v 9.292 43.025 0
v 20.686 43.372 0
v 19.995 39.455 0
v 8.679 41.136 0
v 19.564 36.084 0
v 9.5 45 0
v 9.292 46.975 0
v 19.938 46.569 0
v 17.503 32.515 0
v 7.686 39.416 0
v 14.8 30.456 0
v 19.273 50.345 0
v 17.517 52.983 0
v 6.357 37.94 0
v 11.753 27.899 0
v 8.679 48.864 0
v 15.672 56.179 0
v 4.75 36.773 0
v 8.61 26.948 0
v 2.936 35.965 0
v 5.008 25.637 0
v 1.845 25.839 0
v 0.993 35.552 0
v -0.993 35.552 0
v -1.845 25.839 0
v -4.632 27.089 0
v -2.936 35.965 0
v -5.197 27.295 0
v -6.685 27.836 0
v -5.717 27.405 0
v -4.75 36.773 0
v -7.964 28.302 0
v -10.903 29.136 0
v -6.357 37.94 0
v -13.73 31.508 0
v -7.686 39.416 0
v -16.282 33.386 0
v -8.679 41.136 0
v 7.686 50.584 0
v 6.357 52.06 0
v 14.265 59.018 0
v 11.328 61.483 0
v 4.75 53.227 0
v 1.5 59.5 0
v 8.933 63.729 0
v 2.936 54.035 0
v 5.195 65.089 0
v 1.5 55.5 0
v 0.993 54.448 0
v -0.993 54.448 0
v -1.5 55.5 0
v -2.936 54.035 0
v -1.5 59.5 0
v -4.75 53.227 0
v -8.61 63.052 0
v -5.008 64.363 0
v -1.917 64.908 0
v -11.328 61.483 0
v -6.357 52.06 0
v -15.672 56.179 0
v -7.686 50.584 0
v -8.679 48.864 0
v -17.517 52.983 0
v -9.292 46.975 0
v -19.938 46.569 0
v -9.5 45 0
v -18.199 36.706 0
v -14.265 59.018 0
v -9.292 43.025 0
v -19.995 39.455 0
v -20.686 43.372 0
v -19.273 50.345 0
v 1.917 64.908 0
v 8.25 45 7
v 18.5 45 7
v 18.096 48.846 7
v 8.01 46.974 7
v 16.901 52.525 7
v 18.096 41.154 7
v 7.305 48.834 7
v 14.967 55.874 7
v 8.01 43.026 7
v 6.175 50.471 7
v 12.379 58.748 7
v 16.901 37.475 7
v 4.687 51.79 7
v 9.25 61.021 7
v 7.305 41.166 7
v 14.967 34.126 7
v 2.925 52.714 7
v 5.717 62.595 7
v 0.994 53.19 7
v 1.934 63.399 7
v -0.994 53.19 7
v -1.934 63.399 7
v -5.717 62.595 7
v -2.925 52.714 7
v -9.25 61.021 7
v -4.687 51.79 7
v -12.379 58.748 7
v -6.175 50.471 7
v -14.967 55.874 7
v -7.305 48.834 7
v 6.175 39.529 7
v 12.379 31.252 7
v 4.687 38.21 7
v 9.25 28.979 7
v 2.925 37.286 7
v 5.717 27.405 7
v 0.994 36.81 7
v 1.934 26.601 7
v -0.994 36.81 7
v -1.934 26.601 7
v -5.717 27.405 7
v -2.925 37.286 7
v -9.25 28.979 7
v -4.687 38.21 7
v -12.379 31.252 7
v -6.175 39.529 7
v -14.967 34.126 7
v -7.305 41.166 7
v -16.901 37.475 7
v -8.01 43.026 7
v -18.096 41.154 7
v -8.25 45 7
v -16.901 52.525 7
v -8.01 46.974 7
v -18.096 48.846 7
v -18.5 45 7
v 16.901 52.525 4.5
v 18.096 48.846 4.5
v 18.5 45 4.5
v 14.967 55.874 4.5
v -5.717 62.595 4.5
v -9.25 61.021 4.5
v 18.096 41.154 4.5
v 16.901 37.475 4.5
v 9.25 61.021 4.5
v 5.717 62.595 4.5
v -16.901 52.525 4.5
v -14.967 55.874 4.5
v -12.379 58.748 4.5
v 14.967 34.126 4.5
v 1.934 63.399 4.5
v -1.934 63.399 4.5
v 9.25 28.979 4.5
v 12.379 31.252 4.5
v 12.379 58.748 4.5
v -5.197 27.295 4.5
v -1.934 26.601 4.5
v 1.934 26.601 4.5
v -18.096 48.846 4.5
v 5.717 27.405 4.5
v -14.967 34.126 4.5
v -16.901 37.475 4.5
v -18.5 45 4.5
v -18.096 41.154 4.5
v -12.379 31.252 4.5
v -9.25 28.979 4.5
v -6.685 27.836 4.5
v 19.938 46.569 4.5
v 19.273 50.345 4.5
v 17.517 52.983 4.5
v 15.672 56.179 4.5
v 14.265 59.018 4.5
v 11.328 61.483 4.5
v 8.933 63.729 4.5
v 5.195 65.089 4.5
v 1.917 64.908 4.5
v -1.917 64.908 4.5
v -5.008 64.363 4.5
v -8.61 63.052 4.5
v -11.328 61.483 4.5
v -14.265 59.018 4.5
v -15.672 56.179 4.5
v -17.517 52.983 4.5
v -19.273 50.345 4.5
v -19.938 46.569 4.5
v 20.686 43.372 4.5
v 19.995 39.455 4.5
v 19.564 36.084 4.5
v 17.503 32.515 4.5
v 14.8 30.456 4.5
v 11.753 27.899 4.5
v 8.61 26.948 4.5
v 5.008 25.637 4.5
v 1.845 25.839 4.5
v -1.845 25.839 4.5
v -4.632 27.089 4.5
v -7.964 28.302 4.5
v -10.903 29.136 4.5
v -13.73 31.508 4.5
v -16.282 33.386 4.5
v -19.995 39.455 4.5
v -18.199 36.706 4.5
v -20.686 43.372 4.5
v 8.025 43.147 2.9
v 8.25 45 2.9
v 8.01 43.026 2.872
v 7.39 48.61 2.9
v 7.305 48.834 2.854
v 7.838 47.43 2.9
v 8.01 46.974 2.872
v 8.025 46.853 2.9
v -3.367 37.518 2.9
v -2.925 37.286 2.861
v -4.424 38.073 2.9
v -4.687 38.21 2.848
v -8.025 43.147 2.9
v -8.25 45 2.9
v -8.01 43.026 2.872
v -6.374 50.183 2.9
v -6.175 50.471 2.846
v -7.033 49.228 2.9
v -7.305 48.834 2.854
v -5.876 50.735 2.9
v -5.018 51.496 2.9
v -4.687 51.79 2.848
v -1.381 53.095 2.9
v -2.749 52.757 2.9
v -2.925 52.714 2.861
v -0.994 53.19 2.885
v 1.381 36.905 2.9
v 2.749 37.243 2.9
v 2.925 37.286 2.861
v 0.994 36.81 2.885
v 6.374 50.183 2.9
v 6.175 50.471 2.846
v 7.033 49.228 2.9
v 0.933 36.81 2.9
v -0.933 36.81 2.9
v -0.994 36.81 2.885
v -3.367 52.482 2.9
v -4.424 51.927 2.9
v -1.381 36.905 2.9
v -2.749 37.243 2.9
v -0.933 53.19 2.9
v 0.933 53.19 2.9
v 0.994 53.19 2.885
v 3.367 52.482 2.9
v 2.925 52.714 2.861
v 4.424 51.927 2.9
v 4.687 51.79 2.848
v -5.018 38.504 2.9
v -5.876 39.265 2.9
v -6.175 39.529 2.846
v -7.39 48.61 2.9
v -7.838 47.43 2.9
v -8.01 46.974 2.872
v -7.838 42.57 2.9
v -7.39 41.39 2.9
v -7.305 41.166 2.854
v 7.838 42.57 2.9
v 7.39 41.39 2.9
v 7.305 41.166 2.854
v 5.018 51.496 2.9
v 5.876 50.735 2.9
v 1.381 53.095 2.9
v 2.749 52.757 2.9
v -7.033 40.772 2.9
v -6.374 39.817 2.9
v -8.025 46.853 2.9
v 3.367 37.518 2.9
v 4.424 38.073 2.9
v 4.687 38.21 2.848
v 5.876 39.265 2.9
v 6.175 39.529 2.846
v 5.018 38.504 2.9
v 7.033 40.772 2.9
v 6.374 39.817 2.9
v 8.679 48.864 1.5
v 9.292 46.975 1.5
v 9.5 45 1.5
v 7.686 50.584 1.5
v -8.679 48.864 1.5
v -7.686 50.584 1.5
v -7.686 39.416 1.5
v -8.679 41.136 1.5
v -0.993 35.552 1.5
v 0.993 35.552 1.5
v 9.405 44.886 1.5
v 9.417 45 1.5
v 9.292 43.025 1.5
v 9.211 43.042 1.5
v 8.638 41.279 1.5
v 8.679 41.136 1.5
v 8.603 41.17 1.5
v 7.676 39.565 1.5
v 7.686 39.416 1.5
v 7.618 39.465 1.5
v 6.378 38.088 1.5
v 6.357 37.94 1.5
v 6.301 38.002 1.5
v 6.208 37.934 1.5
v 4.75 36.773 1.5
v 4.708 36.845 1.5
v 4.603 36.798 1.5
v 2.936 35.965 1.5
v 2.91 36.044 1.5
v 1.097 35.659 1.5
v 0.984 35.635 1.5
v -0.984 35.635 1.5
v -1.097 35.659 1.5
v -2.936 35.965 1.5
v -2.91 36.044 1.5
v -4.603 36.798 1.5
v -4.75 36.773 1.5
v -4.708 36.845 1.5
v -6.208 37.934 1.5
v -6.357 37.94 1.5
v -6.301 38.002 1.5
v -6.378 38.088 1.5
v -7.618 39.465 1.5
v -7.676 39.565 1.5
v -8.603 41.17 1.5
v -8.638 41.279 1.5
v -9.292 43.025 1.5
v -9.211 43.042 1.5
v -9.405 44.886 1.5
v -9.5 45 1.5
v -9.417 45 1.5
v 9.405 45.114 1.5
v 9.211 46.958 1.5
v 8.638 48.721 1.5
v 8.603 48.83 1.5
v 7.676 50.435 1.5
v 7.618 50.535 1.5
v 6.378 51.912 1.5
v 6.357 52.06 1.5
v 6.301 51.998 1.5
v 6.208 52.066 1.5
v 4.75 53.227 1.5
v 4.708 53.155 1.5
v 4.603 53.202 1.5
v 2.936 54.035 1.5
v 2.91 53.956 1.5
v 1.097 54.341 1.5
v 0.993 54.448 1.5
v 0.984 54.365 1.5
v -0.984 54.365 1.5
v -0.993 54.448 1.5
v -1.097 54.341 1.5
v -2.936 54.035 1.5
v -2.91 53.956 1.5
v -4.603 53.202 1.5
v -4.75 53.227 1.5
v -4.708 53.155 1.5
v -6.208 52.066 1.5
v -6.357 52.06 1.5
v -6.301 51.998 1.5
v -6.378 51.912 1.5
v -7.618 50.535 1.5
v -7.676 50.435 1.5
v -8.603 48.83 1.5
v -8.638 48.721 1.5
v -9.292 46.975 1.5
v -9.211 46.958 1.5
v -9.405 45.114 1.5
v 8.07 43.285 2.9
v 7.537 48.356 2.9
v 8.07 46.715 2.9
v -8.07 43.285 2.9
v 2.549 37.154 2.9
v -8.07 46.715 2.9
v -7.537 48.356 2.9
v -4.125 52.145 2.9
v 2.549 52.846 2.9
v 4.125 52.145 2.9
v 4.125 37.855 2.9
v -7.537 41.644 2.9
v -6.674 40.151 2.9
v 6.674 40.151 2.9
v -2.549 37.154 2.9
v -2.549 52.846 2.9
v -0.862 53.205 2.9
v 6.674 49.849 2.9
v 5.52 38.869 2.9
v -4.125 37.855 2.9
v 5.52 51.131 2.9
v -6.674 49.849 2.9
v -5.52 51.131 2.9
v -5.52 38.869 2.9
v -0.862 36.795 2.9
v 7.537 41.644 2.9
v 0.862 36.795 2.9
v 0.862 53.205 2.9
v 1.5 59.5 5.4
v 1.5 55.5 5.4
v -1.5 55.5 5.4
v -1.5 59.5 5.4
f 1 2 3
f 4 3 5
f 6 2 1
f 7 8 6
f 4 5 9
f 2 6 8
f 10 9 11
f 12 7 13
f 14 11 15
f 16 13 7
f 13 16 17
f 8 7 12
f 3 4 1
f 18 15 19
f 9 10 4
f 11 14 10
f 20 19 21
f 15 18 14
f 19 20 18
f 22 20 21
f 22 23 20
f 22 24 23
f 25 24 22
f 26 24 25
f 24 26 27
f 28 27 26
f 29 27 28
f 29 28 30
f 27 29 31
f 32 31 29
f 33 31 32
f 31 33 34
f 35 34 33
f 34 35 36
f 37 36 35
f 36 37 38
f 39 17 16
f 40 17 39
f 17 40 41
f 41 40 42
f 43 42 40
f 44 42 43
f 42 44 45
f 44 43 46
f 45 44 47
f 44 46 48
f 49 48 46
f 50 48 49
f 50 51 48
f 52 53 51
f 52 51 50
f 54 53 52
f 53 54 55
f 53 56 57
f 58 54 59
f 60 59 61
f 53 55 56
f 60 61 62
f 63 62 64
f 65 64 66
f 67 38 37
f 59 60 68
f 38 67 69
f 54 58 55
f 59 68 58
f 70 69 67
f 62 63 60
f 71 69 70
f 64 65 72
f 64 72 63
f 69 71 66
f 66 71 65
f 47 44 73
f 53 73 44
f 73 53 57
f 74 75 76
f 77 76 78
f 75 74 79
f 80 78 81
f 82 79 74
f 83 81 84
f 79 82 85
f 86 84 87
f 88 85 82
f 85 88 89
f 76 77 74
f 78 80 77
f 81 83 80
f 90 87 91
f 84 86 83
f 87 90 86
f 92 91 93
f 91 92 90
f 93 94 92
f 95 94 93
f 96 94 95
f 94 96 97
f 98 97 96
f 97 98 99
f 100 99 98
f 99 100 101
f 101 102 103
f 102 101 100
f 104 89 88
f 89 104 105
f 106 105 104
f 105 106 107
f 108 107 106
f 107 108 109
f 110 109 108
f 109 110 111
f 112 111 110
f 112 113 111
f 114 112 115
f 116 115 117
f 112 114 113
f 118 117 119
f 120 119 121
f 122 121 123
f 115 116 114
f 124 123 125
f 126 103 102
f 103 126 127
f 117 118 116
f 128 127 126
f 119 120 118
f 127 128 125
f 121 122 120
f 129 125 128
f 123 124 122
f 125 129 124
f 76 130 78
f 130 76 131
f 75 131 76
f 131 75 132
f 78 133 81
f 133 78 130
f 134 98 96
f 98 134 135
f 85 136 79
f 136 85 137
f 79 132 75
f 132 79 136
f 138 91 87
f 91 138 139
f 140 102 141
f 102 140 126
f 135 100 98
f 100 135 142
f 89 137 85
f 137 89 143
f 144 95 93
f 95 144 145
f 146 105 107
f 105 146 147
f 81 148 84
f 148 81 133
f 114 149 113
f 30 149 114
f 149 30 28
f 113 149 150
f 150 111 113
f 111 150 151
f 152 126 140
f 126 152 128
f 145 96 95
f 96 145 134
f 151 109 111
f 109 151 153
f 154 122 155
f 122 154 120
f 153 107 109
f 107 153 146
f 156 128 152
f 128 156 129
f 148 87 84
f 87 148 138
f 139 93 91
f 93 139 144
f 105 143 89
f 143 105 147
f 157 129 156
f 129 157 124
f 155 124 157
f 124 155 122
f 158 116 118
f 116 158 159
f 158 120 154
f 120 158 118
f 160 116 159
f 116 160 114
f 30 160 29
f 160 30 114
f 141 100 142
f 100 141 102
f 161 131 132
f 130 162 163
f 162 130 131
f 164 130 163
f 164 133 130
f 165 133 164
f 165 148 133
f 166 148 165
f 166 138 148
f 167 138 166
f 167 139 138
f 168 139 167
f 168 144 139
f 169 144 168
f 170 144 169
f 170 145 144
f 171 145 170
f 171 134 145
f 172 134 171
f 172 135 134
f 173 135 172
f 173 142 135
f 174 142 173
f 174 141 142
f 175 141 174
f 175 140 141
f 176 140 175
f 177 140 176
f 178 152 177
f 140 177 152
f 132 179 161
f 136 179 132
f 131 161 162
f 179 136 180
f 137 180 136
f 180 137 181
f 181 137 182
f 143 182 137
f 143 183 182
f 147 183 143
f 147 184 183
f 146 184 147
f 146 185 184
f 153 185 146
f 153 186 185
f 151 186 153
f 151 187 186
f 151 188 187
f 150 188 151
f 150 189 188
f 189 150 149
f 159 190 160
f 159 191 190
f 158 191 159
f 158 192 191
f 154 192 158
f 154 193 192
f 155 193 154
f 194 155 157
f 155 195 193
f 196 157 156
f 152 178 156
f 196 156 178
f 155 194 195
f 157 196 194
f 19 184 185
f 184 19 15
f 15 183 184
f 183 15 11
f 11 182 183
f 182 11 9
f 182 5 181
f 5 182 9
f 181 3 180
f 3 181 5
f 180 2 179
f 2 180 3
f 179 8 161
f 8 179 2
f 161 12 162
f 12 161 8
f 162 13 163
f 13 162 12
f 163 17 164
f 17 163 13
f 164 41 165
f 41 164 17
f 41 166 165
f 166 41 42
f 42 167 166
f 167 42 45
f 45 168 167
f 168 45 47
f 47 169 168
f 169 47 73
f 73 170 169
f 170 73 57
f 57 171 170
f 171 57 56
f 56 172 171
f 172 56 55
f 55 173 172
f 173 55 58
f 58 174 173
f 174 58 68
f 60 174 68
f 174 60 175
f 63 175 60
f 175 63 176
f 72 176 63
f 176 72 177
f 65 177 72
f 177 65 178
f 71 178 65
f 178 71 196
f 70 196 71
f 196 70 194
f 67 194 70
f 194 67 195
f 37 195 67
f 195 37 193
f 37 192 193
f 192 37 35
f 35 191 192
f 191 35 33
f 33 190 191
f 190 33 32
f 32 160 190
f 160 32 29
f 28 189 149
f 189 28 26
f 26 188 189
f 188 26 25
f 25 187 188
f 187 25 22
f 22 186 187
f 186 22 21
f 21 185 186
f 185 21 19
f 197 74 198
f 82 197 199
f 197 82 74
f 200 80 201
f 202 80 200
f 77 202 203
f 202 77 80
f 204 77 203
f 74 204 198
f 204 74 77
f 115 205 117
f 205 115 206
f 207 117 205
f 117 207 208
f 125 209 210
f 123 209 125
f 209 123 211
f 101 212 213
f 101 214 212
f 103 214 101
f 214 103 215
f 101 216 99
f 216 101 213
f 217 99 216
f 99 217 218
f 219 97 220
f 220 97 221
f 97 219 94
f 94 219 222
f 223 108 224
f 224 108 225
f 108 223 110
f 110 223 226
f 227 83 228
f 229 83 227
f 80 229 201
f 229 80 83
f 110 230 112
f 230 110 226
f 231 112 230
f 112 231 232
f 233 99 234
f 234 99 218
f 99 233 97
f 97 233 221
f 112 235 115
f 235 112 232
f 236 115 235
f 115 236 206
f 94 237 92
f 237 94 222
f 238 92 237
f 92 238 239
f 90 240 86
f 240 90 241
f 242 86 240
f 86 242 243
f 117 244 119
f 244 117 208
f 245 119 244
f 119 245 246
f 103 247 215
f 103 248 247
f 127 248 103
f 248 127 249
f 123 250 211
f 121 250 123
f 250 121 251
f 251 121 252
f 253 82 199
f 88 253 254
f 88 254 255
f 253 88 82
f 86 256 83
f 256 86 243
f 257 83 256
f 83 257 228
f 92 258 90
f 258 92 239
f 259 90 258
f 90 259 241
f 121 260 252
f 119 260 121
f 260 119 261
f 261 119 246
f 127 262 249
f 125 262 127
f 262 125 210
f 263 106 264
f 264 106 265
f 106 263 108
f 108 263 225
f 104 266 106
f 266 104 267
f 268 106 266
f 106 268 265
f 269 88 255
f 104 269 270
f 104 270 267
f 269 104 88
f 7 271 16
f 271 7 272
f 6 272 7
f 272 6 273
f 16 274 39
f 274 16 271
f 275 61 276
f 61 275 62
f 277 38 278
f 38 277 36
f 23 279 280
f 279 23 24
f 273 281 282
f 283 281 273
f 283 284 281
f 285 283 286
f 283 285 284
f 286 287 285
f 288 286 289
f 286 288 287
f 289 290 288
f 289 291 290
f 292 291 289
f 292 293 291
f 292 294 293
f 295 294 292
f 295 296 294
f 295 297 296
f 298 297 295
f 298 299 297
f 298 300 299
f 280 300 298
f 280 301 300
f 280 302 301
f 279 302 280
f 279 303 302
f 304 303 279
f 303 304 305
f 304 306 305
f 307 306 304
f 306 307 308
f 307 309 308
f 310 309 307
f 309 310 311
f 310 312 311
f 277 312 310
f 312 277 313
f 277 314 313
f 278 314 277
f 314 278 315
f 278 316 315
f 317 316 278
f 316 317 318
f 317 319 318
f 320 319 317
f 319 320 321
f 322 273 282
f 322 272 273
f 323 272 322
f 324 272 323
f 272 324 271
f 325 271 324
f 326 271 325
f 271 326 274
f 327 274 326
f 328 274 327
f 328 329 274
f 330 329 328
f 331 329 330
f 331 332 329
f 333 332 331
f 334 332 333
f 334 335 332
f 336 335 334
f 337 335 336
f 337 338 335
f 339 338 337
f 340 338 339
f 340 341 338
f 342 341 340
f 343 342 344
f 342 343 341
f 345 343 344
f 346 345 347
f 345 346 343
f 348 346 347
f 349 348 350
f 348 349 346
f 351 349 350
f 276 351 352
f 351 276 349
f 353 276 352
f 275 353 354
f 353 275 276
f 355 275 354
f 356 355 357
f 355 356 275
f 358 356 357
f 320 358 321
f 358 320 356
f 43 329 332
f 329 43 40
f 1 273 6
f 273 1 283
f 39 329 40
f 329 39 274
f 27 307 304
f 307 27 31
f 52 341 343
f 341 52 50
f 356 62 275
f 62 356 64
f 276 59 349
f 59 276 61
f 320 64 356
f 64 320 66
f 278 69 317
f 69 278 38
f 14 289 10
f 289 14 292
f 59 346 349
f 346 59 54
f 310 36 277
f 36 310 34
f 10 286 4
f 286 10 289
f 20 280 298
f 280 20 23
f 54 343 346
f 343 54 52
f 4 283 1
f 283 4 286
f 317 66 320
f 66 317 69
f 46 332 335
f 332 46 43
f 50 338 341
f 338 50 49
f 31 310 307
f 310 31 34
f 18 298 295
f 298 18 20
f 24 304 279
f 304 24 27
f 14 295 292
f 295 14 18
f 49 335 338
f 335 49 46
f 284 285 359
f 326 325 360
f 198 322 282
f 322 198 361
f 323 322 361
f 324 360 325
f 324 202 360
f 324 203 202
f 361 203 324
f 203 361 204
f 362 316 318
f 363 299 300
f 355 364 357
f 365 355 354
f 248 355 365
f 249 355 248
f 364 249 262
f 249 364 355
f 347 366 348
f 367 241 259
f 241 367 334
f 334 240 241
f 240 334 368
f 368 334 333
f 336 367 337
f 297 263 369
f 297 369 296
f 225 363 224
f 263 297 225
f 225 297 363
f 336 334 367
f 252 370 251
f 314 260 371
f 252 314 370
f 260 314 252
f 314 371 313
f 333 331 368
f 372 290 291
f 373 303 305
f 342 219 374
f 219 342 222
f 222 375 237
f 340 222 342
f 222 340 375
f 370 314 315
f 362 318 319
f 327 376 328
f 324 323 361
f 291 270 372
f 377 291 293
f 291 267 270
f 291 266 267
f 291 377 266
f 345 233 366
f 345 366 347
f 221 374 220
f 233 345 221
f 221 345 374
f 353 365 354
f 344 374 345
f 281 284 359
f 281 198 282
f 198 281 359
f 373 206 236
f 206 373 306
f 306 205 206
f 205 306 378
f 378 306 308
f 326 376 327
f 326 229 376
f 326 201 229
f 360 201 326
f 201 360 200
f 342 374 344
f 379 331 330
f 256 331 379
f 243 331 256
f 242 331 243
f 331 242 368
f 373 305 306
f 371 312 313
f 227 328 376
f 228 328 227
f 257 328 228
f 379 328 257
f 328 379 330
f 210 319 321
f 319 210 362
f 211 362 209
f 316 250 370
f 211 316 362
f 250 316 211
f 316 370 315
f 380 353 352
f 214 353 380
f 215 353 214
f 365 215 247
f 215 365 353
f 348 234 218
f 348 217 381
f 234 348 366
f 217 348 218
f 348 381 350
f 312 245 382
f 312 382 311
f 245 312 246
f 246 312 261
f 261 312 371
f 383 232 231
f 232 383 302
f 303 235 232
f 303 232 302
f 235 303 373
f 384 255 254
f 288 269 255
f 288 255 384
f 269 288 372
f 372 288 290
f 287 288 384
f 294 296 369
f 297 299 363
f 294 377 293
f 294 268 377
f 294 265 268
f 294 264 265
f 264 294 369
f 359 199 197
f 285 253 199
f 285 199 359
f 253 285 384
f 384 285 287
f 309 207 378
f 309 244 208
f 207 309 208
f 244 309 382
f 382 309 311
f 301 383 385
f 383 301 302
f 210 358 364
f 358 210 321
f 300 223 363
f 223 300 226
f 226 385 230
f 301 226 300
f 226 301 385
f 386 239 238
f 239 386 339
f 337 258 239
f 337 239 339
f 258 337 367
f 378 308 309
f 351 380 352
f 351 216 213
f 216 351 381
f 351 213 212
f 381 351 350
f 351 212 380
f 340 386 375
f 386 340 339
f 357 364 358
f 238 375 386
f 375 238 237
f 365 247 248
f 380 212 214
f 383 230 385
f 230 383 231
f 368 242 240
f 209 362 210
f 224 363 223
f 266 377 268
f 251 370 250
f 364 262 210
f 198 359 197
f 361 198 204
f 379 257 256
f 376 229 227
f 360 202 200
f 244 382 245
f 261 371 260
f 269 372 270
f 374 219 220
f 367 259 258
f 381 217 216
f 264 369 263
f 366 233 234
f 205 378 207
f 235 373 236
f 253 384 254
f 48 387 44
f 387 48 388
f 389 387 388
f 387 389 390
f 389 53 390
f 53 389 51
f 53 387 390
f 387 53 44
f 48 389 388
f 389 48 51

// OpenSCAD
// file: Cam-as-18-Sided-Polygon.scad
/*  Provides a common method / function / module to 3D Print an 18 sided polygon for a cam used by Elna Supermatic, Elna SU machines sewing machines, matching with the 18 punches made by the needle per each rotation of a cam.

    Copyright (C) 2020  L Komandur

    This program is free software: you can redistribute it and/or modify
    it under the terms of the GNU General Public License as published by
    the Free Software Foundation, either version 3 of the License, or
    (at your option) any later version.

    This program is distributed in the hope that it will be useful,
    but WITHOUT ANY WARRANTY; without even the implied warranty of
    MERCHANTABILITY or FITNESS FOR A PARTICULAR PURPOSE.  See the
    GNU General Public License for more details.

    You should have received a copy of the GNU General Public License
    along with this program.  If not, see <https://www.gnu.org/licenses/>.
*/

thickest_cyl_rad = 17;
skirting_width=1.5;

angle_of_side = 11;
min_radius = thickest_cyl_rad+skirting_width;

module plotpoly(p1,p2,p3,p4,p5,p6,p7,p8,p9,p10,p11,p12,p13,p14,p15,p16,p17,p18) {
	//scale ([-1,1])
	polygon( points = [
	[(min_radius + p1)*sin(0-angle_of_side/2), (min_radius + p1)*cos(0-angle_of_side/2)],
	[(min_radius + p1)*sin(0+angle_of_side/2), (min_radius + p1)*cos(0+angle_of_side/2)],
	[(min_radius + p2)*sin(20-angle_of_side/2), (min_radius + p2)*cos(20-angle_of_side/2)],	
	[(min_radius + p2)*sin(20+angle_of_side/2), (min_radius + p2)*cos(20+angle_of_side/2)],	
	[(min_radius + p3)*sin(40-angle_of_side/2), (min_radius + p3)*cos(40-angle_of_side/2)],	
	[(min_radius + p3)*sin(40+angle_of_side/2), (min_radius + p3)*cos(40+angle_of_side/2)],	
	[(min_radius + p4)*sin(60-angle_of_side/2), (min_radius + p4)*cos(60-angle_of_side/2)],	
	[(min_radius + p4)*sin(60+angle_of_side/2), (min_radius + p4)*cos(60+angle_of_side/2)],	
	[(min_radius + p5)*sin(80-angle_of_side/2), (min_radius + p5)*cos(80-angle_of_side/2)],	
	[(min_radius + p5)*sin(80+angle_of_side/2), (min_radius + p5)*cos(80+angle_of_side/2)],	
	[(min_radius + p6)*sin(100-angle_of_side/2), (min_radius + p6)*cos(100-angle_of_side/2)],	
	[(min_radius + p6)*sin(100+angle_of_side/2), (min_radius + p6)*cos(100+angle_of_side/2)],	
	[(min_radius + p7)*sin(120-angle_of_side/2), (min_radius + p7)*cos(120-angle_of_side/2)],	
	[(min_radius + p7)*sin(120+angle_of_side/2), (min_radius + p7)*cos(120+angle_of_side/2)],	
	[(min_radius + p8)*sin(140-angle_of_side/2), (min_radius + p8)*cos(140-angle_of_side/2)],	
	[(min_radius + p8)*sin(140+angle_of_side/2), (min_radius + p8)*cos(140+angle_of_side/2)],	
	[(min_radius + p9)*sin(160-angle_of_side/2), (min_radius + p9)*cos(160-angle_of_side/2)],	
	[(min_radius + p9)*sin(160+angle_of_side/2), (min_radius + p9)*cos(160+angle_of_side/2)],	
	[(min_radius + p10)*sin(180-angle_of_side/2), (min_radius + p10)*cos(180-angle_of_side/2)],	
	[(min_radius + p10)*sin(180+angle_of_side/2), (min_radius + p10)*cos(180+angle_of_side/2)],	
	[(min_radius + p11)*sin(200-angle_of_side/2), (min_radius + p11)*cos(200-angle_of_side/2)],	
	[(min_radius + p11)*sin(200+angle_of_side/2), (min_radius + p11)*cos(200+angle_of_side/2)],	
	[(min_radius + p12)*sin(220-angle_of_side/2), (min_radius + p12)*cos(220-angle_of_side/2)],	
	[(min_radius + p12)*sin(220+angle_of_side/2), (min_radius + p12)*cos(220+angle_of_side/2)],	
	[(min_radius + p13)*sin(240-angle_of_side/2), (min_radius + p13)*cos(240-angle_of_side/2)],	
	[(min_radius + p13)*sin(240+angle_of_side/2), (min_radius + p13)*cos(240+angle_of_side/2)],	
	[(min_radius + p14)*sin(260-angle_of_side/2), (min_radius + p14)*cos(260-angle_of_side/2)],	
	[(min_radius + p14)*sin(260+angle_of_side/2), (min_radius + p14)*cos(260+angle_of_side/2)],	
	[(min_radius + p15)*sin(280-angle_of_side/2), (min_radius + p15)*cos(280-angle_of_side/2)],	
	[(min_radius + p15)*sin(280+angle_of_side/2), (min_radius + p15)*cos(280+angle_of_side/2)],	
	[(min_radius + p16)*sin(300-angle_of_side/2), (min_radius + p16)*cos(300-angle_of_side/2)],		
	[(min_radius + p16)*sin(300+angle_of_side/2), (min_radius + p16)*cos(300+angle_of_side/2)],		
	[(min_radius + p17)*sin(320-angle_of_side/2), (min_radius + p17)*cos(320-angle_of_side/2)],	
	[(min_radius + p17)*sin(320+angle_of_side/2), (min_radius + p17)*cos(320+angle_of_side/2)],	
	[(min_radius + p18)*sin(340-angle_of_side/2), (min_radius + p18)*cos(340-angle_of_side/2)],
	[(min_radius + p18)*sin(340+angle_of_side/2), (min_radius + p18)*cos(340+angle_of_side/2)]
	]);

}
// main file
/*  3D Prints a "single cam" similar to Cam No 16 of Elna Supermatic, Elna SU machines sewing machines.

    Copyright (C) 2020  L Komandur

    This program is free software: you can redistribute it and/or modify
    it under the terms of the GNU General Public License as published by
    the Free Software Foundation, either version 3 of the License, or
    (at your option) any later version.

    This program is distributed in the hope that it will be useful,
    but WITHOUT ANY WARRANTY; without even the implied warranty of
    MERCHANTABILITY or FITNESS FOR A PARTICULAR PURPOSE.  See the
    GNU General Public License for more details.

    You should have received a copy of the GNU General Public License
    along with this program.  If not, see <https://www.gnu.org/licenses/>.
*/
use <Cam-as-18-Sided-Polygon.scad>

double_disc_thickness = 9;

disc_thickness = 7; // 7 for single, 9 for double
thickest_cyl_rad = 17;

lobe_thickness = 4.5;
inner_hole_rad = 8.25;
hole_bigger_rad = 9.5;
bigger_hole_ht = 1.5;
cut_errors = 0.1;
hole_cone_ht = 1.5;
skirting = 0;


gap_bet_cloth_needle_cams = disc_thickness-2*skirting-2*lobe_thickness;

gap_to_transporthole = 1;

transporthole_width = 3;
transporthole_depth = 5.5;
transporthole_length  = 4;

peak=3;
c=peak/2;
l=0;
r=peak;
cl=peak/4;
cr=peak*3/4;
skirting_width=1.5;
min_radius = thickest_cyl_rad+skirting_width;


module letter(l,font="font.dxf",h=100,i=0) {
	union() {
		linear_extrude( height=h) import(font, layer=l[i]);
		translate([dxf_dim(file=font, name="advx",layer=l[i]),
			dxf_dim(file=font, name="advy",layer=l[i]),
			0])
			child();
	}
}

module word(wrd,font="font.dxf",h=100,i=0) {
	if(i < len(wrd)) {
		letter(wrd,font,h,i) word(wrd,font,h,i+1);
	} else {
		child();
	}
}

module print_s16_cam(x,y) {

	translate([x, y, 0]) rotate(a=[0,0,0]) difference() {
		union() {
			// tall INNER tall cylinder that excludes skirting 
		cylinder(h = disc_thickness, r = thickest_cyl_rad);
	
			// 2nd bigger cylinder shared between 2 cams and skirting; any sewing information would go here.
	
		translate([0, 0, skirting]) cylinder(h = disc_thickness - skirting*2, r = thickest_cyl_rad + skirting_width);
		translate([0, 0, skirting])
		linear_extrude (height  = lobe_thickness)
			plotpoly(c,cr,c,cl,c,cr,r,cr,c,cl,l,cl,c,cr,c,cl,c,c);
		
	
		}
	
		// Subtract the inner hole. Be very generous.
		translate([0, 0, disc_thickness/2])
			cylinder(h = disc_thickness+1, r = inner_hole_rad, center = true);
	
		// Subtract the lower wider hole
		translate([0, 0, -cut_errors])
			cylinder(h = bigger_hole_ht+cut_errors, r = hole_bigger_rad);
	
	
		// Subtract the cone between wide hole and smaller hole.
		translate([0, 0, bigger_hole_ht-cut_errors])
			cylinder(h = hole_cone_ht, r1 = hole_bigger_rad, r2 = inner_hole_rad);
	
		// Subtract the upper cone the disk locks on the sewing machine post (only for double cams).
		translate([0, 0, double_disc_thickness-skirting-2+cut_errors])
			cylinder(h = 2, r = hole_bigger_rad);
	
		// Initials on the side of transport hole as depressions (top side while printing).
	
		for (letter_depth = [1:6])
		{
			rotate(a=[0, 0, 0]) translate([-2.25, 10.5, disc_thickness-0.1*letter_depth]) scale(0.0015) letter("O");
			rotate(a=[0, 0, 0]) translate([-1.5, 11.25, disc_thickness-0.1*letter_depth]) scale(0.001) letter("O");
			rotate(a=[0, 0, 140]) translate([-8, 10, disc_thickness-0.1*letter_depth]) scale(0.002) letter("E");
			rotate(a=[0, 0, 130]) translate([-4, 11, disc_thickness-0.1*letter_depth]) scale(0.002) letter("L");
			rotate(a=[0, 0, 120]) translate([-0, 11, disc_thickness-0.1*letter_depth]) scale(0.002) letter("N");
			rotate(a=[0, 0, 110]) translate([4, 10, disc_thickness-0.1*letter_depth]) scale(0.002) letter("A");

			rotate(a=[0, 0, 115]) translate([-9, -15, disc_thickness-0.1*letter_depth]) scale(0.002) letter(" ");
			rotate(a=[0, 0, 115]) translate([-4, -16, disc_thickness-0.1*letter_depth]) scale(0.002) letter("1");
			rotate(a=[0, 0, 115]) translate([1, -16,disc_thickness-0.1*letter_depth]) scale(0.002) letter("6");
		}
		// Transport hole made as a rectangular  hole
		difference() {
			rotate(a=[0, 0, 0]) translate([0, hole_bigger_rad + gap_to_transporthole + transporthole_length/2, transporthole_depth/2-cut_errors])
				cube(size = [transporthole_width, transporthole_length, transporthole_depth], center = true);
	
		}
	}
}

print_s16_cam(0,45);
